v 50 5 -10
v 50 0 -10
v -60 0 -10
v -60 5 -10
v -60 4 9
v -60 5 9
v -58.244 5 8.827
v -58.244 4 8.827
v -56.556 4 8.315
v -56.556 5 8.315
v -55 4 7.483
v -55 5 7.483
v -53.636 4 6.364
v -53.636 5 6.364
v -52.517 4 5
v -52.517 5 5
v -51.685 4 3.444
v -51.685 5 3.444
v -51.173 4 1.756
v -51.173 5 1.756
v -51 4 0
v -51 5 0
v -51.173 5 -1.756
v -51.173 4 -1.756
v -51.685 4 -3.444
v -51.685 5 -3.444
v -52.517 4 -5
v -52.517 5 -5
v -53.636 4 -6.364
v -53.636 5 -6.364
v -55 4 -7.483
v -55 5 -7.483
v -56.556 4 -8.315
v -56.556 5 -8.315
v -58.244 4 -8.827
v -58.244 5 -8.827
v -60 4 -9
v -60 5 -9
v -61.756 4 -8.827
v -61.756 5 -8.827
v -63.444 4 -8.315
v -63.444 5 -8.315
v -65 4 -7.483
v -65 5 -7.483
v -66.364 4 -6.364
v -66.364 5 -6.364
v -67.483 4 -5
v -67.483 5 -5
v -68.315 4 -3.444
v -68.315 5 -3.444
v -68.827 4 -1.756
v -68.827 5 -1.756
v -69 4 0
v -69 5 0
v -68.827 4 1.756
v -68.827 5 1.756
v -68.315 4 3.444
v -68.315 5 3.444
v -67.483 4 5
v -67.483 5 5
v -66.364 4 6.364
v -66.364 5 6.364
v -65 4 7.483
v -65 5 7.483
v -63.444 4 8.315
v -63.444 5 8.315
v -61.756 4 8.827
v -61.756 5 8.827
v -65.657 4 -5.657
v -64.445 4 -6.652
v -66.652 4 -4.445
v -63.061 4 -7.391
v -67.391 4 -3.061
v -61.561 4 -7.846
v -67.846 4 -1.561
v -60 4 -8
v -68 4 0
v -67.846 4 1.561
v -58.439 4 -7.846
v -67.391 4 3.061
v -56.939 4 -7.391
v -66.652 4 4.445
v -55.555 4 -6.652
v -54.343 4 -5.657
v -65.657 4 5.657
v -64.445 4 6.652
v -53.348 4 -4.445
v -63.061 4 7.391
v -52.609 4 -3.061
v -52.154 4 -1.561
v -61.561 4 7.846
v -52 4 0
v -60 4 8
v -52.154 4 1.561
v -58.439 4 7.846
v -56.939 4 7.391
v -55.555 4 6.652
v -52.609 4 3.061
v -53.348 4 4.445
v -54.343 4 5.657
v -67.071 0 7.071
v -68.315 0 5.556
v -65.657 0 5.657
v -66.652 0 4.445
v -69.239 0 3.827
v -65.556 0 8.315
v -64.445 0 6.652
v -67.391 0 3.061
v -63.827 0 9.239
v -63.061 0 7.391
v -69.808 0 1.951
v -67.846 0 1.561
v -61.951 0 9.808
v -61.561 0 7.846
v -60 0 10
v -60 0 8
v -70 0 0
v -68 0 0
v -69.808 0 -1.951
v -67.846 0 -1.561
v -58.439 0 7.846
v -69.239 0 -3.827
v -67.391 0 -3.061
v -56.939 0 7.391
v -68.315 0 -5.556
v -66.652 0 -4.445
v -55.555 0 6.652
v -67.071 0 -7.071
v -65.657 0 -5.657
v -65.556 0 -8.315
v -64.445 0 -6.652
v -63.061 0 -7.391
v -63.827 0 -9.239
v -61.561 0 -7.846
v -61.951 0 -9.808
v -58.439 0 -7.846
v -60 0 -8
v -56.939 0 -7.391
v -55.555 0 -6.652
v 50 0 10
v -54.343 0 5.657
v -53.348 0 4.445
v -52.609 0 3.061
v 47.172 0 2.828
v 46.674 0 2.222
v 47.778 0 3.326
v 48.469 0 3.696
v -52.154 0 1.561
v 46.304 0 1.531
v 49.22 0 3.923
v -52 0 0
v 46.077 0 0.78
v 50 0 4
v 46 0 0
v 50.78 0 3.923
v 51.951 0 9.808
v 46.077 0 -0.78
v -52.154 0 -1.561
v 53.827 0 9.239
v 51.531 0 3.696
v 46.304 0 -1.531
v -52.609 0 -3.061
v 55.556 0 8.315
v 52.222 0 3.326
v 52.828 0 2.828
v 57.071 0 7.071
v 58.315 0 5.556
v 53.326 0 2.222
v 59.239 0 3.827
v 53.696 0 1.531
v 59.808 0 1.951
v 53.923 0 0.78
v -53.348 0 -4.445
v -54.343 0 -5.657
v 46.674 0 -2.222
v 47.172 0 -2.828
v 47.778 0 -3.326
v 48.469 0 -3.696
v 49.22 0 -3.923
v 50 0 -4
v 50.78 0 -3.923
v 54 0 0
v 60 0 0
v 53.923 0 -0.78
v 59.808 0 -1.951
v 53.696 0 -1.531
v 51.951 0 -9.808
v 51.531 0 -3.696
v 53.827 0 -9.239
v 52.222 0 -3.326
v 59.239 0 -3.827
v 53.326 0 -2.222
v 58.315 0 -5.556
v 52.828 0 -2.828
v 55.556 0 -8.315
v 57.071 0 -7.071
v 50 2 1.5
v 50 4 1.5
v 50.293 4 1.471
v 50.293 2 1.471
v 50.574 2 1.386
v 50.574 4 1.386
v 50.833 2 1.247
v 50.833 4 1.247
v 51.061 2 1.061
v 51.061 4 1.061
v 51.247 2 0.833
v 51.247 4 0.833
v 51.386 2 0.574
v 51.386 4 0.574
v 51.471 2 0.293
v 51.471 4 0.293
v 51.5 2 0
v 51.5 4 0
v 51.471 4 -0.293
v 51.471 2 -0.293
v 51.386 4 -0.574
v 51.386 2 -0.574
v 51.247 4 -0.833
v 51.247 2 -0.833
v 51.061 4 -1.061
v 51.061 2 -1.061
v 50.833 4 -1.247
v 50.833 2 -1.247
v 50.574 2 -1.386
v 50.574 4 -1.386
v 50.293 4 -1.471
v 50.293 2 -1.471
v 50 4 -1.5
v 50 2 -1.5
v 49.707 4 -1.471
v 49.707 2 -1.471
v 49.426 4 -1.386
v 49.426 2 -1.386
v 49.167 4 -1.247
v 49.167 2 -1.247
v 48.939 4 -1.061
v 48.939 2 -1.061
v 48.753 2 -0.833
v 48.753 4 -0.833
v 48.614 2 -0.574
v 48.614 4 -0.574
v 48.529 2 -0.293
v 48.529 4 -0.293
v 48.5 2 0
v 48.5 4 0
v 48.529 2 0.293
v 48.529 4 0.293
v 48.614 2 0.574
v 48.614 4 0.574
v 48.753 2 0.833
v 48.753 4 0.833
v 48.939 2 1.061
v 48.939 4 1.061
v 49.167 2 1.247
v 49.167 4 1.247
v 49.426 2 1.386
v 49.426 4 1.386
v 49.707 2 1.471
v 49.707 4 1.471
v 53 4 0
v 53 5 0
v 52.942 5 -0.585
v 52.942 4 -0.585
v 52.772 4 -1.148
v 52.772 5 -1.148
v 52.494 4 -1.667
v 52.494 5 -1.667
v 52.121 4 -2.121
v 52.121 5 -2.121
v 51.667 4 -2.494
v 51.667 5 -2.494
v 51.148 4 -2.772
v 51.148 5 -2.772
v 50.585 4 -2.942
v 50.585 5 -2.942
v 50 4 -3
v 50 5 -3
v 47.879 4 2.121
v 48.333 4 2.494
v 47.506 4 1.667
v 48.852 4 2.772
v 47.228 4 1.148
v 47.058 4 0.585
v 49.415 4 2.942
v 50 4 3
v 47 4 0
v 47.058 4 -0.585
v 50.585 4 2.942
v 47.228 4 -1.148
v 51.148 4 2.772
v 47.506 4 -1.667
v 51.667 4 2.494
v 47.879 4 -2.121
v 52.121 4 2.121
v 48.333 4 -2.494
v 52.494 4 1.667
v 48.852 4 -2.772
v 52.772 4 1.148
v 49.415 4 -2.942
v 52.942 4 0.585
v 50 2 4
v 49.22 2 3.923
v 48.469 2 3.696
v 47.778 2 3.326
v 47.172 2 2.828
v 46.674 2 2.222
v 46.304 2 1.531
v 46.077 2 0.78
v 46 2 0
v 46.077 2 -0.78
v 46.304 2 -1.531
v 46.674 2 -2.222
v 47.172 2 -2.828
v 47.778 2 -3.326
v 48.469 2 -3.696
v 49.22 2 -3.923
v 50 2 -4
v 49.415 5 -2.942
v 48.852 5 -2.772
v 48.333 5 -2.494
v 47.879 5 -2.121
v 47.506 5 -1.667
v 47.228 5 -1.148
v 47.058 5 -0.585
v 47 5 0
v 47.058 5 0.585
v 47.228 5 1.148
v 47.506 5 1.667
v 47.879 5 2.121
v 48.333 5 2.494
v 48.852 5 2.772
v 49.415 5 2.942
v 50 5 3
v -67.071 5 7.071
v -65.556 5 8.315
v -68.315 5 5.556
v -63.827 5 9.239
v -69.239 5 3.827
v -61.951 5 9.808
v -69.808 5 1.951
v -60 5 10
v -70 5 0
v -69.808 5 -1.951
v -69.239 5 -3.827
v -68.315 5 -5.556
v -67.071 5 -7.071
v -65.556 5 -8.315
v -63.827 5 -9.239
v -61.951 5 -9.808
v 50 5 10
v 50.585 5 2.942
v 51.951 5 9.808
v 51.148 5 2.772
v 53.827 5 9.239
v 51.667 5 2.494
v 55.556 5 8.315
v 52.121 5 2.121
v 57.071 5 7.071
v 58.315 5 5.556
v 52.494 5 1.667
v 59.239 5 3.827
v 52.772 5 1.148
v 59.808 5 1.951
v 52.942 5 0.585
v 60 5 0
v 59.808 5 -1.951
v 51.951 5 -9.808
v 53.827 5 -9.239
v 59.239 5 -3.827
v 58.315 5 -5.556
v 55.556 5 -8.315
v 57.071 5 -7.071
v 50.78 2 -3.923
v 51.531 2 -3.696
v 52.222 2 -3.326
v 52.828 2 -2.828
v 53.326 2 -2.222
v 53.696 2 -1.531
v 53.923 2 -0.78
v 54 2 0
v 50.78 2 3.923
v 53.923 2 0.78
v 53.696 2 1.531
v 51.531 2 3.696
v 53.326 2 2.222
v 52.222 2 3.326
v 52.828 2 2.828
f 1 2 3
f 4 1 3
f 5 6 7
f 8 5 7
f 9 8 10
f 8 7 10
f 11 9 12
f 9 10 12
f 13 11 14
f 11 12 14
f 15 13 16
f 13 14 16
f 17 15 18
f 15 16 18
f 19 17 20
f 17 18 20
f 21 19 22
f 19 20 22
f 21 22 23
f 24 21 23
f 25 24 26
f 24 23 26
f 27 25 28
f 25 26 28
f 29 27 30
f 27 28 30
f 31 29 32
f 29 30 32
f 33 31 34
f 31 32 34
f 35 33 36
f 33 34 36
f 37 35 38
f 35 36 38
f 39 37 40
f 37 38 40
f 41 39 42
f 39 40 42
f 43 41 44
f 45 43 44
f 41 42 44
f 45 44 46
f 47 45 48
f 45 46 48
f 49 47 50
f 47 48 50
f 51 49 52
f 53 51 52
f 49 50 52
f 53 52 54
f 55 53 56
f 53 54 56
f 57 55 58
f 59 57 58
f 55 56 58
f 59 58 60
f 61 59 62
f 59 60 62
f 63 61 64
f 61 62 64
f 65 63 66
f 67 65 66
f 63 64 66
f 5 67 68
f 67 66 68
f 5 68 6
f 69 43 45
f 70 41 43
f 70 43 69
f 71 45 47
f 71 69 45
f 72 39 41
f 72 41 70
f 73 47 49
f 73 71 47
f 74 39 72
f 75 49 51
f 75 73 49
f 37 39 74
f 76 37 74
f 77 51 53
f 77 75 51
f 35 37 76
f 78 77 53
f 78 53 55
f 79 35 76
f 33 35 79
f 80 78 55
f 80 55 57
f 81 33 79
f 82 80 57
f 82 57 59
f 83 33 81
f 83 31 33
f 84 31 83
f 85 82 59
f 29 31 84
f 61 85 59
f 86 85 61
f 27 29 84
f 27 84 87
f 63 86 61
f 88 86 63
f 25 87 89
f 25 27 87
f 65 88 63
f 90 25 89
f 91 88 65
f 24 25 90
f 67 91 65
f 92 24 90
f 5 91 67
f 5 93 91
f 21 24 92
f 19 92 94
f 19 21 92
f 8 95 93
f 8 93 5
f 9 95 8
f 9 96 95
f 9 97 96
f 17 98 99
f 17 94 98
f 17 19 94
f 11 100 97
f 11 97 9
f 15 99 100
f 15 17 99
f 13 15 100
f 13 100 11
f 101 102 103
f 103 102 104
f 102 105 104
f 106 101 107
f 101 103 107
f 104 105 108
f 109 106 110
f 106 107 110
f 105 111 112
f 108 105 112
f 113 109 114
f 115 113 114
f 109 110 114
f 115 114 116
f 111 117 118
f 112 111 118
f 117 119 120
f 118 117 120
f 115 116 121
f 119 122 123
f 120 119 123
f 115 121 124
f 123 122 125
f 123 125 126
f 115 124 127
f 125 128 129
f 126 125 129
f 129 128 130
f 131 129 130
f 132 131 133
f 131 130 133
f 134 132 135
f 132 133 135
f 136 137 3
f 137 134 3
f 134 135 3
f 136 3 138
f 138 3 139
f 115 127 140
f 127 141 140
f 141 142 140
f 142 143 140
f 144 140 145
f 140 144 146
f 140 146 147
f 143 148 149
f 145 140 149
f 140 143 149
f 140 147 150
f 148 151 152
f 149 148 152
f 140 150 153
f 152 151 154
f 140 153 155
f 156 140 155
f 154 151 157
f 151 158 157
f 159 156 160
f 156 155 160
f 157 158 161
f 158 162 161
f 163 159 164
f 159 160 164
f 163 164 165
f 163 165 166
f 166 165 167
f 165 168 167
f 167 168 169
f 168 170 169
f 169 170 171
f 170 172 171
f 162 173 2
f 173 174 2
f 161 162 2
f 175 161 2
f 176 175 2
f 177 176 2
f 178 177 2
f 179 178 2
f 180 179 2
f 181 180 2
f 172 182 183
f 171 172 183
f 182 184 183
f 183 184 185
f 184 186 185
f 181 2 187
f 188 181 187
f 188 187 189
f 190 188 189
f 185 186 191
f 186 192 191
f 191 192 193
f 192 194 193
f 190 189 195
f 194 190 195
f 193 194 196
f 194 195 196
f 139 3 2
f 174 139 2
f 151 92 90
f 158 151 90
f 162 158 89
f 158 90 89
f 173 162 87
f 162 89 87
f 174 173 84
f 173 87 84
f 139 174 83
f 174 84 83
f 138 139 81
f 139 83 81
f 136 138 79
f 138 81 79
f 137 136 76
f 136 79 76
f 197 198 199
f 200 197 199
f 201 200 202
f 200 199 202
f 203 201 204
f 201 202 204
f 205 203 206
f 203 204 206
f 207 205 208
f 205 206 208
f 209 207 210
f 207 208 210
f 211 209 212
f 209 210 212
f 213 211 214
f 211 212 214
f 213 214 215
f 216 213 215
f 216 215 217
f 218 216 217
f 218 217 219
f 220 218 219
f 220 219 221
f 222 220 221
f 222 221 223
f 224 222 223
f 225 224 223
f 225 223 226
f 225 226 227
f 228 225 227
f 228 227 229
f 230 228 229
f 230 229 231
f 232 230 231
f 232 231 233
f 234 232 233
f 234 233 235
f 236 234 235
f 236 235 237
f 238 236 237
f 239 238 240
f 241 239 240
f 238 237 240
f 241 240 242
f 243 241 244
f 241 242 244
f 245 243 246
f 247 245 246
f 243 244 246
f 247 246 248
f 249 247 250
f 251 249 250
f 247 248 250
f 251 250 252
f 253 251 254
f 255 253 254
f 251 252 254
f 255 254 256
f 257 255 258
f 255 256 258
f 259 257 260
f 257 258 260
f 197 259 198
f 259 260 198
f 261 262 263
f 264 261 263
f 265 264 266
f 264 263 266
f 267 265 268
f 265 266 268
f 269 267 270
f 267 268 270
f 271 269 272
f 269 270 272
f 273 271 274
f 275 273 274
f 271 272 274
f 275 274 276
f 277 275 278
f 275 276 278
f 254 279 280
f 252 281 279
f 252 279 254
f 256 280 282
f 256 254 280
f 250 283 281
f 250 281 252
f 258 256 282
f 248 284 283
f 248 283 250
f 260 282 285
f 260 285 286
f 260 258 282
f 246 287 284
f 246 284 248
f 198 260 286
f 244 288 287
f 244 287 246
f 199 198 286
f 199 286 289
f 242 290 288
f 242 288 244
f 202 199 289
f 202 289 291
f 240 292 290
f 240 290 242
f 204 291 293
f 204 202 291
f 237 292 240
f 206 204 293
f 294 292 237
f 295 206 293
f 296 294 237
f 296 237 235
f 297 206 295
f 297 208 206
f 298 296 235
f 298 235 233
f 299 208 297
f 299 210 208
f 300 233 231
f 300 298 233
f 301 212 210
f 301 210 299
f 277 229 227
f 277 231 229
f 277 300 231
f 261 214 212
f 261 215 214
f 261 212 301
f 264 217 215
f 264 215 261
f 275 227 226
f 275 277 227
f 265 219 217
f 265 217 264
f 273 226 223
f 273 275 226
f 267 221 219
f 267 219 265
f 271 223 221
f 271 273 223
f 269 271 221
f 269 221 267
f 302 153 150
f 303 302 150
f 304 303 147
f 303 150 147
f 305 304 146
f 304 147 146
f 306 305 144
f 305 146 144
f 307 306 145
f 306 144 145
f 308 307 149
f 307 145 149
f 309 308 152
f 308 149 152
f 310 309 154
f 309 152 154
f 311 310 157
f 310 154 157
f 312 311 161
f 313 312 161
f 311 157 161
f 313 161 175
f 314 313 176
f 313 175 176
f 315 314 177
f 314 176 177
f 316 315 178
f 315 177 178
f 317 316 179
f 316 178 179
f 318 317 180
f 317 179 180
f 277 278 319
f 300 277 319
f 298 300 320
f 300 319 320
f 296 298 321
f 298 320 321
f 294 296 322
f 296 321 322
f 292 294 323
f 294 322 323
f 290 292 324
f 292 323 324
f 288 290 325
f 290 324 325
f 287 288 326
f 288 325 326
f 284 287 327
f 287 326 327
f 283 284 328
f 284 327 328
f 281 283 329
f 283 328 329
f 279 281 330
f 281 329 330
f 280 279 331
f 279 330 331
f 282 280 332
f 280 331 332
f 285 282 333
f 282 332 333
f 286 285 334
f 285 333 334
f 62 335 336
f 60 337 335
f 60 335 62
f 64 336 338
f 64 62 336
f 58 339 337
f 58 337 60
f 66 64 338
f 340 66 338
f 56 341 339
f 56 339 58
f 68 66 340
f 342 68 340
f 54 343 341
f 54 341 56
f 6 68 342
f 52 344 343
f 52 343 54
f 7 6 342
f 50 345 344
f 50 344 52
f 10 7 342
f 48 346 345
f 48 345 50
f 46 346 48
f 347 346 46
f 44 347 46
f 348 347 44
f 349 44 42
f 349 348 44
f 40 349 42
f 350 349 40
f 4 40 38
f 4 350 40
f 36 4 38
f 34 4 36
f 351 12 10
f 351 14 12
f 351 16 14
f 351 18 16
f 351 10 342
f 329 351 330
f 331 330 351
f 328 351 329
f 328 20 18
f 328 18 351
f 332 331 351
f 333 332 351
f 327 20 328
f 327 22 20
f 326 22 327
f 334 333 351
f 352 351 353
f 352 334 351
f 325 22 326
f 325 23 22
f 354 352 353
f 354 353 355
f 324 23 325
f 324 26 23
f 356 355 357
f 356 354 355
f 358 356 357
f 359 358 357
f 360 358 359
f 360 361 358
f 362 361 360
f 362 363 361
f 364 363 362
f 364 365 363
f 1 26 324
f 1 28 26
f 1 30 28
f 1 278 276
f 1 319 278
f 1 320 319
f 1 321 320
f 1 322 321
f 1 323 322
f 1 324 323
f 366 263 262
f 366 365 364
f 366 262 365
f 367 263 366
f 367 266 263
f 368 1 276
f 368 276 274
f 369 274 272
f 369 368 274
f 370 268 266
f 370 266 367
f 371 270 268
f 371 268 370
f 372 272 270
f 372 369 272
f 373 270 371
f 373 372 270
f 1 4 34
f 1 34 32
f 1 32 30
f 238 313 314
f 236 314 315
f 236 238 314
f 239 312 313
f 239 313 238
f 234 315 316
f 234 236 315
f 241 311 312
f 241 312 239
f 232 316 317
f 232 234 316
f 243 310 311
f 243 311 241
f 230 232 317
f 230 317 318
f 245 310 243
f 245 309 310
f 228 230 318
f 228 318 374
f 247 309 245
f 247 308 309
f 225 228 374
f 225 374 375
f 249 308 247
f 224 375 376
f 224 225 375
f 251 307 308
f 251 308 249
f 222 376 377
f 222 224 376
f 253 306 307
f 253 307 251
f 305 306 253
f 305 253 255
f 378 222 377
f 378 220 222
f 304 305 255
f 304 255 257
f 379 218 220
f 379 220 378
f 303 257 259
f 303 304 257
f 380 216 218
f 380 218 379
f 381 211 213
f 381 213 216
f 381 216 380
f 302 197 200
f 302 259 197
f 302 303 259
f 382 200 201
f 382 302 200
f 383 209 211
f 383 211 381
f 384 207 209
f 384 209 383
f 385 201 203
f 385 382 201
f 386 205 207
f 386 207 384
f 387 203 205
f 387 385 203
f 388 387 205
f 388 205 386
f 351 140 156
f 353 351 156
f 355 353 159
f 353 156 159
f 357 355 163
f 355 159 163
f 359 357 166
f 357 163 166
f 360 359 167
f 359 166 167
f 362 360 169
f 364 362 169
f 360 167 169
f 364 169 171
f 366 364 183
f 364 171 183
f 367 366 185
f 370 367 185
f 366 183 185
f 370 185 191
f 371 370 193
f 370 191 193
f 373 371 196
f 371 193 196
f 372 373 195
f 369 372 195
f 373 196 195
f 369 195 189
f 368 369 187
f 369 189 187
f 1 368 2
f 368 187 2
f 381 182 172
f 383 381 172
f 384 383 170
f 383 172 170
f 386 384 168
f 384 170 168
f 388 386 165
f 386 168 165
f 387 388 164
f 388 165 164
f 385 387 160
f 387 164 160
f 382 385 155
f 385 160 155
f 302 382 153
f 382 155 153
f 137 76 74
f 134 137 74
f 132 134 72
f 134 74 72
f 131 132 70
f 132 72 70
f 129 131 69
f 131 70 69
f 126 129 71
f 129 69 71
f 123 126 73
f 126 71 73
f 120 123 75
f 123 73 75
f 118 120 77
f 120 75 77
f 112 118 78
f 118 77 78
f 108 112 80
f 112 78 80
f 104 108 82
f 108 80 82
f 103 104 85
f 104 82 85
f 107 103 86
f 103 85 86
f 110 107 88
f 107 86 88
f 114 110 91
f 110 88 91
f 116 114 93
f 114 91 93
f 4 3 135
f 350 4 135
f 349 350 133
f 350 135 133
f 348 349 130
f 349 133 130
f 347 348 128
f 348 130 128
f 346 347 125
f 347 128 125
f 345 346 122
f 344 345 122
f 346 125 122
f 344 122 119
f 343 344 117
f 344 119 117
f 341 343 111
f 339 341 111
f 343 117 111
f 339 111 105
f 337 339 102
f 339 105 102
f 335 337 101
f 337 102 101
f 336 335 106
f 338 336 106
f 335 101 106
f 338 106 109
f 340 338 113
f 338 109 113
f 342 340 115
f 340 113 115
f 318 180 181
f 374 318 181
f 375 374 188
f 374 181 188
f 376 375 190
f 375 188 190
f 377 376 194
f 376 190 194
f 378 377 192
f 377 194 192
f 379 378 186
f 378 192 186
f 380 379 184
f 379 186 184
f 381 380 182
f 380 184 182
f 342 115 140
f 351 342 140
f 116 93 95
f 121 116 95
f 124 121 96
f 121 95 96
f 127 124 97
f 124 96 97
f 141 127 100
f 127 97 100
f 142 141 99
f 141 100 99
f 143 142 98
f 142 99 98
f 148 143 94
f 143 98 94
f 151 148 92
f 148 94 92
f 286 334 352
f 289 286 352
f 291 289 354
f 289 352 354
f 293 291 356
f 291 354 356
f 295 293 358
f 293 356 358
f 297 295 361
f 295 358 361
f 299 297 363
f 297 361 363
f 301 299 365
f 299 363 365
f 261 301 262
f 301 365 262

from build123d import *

# Parameters (mm, degrees)
BOSS_EXTRUDE1_DEPTH = 5
CUT_EXTRUDE1_DEPTH  = 2
CUT_EXTRUDE2_DEPTH  = 1
CUT_EXTRUDE3_DEPTH  = 71.887234394
SKETCH5_R           = 9
CUT_EXTRUDE4_DEPTH  = 1
SKETCH6_R           = 1.5
CUT_EXTRUDE5_DEPTH  = 71.823724839


with BuildPart() as part:
    # Sketch1 → Boss-Extrude1 (new body)
    with BuildSketch(Plane(origin=(0, 0, 0), x_dir=(1, 0, 0), z_dir=(0, 1, 0))):
        with BuildLine():
            Line((-50, 10), (-60, 10))
            ThreePointArc((-60, 10), (-70, 0), (-60, -10))
            Line((-60, -10), (50, -10))
            ThreePointArc((50, -10), (60, 0), (50, 10))
            Line((50, 10), (-50, 10))
        make_face()
    extrude(amount=BOSS_EXTRUDE1_DEPTH)

    # Sketch2 → Cut-Extrude1 (cut)
    with BuildSketch(Plane.XZ):
        with BuildLine():
            ThreePointArc((50, 4), (46, 0), (50, -4))
            Line((50, -4), (50, 4))
        make_face()
        with BuildLine():
            Line((50, 4), (50, -4))
            ThreePointArc((50, -4), (52.828427125, -2.828427125), (54, 0))
            ThreePointArc((54, 0), (52.828427125, 2.828427125), (50, 4))
        make_face()
    extrude(amount=-CUT_EXTRUDE1_DEPTH, mode=Mode.SUBTRACT)

    # Sketch3 → Cut-Extrude2 (cut)
    with BuildSketch(Plane(origin=(0, 5, 0), x_dir=(1, 0, 0), z_dir=(0, 1, 0))):
        with BuildLine():
            ThreePointArc((53, 0), (52.121320344, 2.121320344), (50, 3))
            Line((50, 3), (50, -3))
            ThreePointArc((50, -3), (52.121320344, -2.121320344), (53, 0))
        make_face()
        with BuildLine():
            Line((50, -3), (50, 3))
            ThreePointArc((50, 3), (47, 0), (50, -3))
        make_face()
    extrude(amount=-CUT_EXTRUDE2_DEPTH, mode=Mode.SUBTRACT)

    # Sketch4 → Cut-Extrude3 (cut, through all)
    with BuildSketch(Plane(origin=(0, 5, 0), x_dir=(1, 0, 0), z_dir=(0, 1, 0))):
        with BuildLine():
            ThreePointArc((-52, 0), (-54.343145751, 5.656854249), (-60, 8))
            Line((-60, 8), (-60, -8))
            ThreePointArc((-60, -8), (-54.343145751, -5.656854249), (-52, 0))
        make_face()
        with BuildLine():
            Line((-60, -8), (-60, 8))
            ThreePointArc((-60, 8), (-68, 0), (-60, -8))
        make_face()
    extrude(amount=-CUT_EXTRUDE3_DEPTH, mode=Mode.SUBTRACT)

    # Sketch5 → Cut-Extrude4 (cut)
    with BuildSketch(Plane(origin=(0, 5, 0), x_dir=(1, 0, 0), z_dir=(0, 1, 0))):
        with Locations(Location((-60, 0, 0), (0, 0, 270))):
            Circle(SKETCH5_R)
    extrude(amount=-CUT_EXTRUDE4_DEPTH, mode=Mode.SUBTRACT)

    # Sketch6 → Cut-Extrude5 (cut, through all)
    with BuildSketch(Plane(origin=(0, 4, 0), x_dir=(1, 0, 0), z_dir=(0, 1, 0))):
        with Locations(Location((50, 0, 0), (0, 0, 270))):
            Circle(SKETCH6_R)
    extrude(amount=-CUT_EXTRUDE5_DEPTH, mode=Mode.SUBTRACT)


solid = part.part
